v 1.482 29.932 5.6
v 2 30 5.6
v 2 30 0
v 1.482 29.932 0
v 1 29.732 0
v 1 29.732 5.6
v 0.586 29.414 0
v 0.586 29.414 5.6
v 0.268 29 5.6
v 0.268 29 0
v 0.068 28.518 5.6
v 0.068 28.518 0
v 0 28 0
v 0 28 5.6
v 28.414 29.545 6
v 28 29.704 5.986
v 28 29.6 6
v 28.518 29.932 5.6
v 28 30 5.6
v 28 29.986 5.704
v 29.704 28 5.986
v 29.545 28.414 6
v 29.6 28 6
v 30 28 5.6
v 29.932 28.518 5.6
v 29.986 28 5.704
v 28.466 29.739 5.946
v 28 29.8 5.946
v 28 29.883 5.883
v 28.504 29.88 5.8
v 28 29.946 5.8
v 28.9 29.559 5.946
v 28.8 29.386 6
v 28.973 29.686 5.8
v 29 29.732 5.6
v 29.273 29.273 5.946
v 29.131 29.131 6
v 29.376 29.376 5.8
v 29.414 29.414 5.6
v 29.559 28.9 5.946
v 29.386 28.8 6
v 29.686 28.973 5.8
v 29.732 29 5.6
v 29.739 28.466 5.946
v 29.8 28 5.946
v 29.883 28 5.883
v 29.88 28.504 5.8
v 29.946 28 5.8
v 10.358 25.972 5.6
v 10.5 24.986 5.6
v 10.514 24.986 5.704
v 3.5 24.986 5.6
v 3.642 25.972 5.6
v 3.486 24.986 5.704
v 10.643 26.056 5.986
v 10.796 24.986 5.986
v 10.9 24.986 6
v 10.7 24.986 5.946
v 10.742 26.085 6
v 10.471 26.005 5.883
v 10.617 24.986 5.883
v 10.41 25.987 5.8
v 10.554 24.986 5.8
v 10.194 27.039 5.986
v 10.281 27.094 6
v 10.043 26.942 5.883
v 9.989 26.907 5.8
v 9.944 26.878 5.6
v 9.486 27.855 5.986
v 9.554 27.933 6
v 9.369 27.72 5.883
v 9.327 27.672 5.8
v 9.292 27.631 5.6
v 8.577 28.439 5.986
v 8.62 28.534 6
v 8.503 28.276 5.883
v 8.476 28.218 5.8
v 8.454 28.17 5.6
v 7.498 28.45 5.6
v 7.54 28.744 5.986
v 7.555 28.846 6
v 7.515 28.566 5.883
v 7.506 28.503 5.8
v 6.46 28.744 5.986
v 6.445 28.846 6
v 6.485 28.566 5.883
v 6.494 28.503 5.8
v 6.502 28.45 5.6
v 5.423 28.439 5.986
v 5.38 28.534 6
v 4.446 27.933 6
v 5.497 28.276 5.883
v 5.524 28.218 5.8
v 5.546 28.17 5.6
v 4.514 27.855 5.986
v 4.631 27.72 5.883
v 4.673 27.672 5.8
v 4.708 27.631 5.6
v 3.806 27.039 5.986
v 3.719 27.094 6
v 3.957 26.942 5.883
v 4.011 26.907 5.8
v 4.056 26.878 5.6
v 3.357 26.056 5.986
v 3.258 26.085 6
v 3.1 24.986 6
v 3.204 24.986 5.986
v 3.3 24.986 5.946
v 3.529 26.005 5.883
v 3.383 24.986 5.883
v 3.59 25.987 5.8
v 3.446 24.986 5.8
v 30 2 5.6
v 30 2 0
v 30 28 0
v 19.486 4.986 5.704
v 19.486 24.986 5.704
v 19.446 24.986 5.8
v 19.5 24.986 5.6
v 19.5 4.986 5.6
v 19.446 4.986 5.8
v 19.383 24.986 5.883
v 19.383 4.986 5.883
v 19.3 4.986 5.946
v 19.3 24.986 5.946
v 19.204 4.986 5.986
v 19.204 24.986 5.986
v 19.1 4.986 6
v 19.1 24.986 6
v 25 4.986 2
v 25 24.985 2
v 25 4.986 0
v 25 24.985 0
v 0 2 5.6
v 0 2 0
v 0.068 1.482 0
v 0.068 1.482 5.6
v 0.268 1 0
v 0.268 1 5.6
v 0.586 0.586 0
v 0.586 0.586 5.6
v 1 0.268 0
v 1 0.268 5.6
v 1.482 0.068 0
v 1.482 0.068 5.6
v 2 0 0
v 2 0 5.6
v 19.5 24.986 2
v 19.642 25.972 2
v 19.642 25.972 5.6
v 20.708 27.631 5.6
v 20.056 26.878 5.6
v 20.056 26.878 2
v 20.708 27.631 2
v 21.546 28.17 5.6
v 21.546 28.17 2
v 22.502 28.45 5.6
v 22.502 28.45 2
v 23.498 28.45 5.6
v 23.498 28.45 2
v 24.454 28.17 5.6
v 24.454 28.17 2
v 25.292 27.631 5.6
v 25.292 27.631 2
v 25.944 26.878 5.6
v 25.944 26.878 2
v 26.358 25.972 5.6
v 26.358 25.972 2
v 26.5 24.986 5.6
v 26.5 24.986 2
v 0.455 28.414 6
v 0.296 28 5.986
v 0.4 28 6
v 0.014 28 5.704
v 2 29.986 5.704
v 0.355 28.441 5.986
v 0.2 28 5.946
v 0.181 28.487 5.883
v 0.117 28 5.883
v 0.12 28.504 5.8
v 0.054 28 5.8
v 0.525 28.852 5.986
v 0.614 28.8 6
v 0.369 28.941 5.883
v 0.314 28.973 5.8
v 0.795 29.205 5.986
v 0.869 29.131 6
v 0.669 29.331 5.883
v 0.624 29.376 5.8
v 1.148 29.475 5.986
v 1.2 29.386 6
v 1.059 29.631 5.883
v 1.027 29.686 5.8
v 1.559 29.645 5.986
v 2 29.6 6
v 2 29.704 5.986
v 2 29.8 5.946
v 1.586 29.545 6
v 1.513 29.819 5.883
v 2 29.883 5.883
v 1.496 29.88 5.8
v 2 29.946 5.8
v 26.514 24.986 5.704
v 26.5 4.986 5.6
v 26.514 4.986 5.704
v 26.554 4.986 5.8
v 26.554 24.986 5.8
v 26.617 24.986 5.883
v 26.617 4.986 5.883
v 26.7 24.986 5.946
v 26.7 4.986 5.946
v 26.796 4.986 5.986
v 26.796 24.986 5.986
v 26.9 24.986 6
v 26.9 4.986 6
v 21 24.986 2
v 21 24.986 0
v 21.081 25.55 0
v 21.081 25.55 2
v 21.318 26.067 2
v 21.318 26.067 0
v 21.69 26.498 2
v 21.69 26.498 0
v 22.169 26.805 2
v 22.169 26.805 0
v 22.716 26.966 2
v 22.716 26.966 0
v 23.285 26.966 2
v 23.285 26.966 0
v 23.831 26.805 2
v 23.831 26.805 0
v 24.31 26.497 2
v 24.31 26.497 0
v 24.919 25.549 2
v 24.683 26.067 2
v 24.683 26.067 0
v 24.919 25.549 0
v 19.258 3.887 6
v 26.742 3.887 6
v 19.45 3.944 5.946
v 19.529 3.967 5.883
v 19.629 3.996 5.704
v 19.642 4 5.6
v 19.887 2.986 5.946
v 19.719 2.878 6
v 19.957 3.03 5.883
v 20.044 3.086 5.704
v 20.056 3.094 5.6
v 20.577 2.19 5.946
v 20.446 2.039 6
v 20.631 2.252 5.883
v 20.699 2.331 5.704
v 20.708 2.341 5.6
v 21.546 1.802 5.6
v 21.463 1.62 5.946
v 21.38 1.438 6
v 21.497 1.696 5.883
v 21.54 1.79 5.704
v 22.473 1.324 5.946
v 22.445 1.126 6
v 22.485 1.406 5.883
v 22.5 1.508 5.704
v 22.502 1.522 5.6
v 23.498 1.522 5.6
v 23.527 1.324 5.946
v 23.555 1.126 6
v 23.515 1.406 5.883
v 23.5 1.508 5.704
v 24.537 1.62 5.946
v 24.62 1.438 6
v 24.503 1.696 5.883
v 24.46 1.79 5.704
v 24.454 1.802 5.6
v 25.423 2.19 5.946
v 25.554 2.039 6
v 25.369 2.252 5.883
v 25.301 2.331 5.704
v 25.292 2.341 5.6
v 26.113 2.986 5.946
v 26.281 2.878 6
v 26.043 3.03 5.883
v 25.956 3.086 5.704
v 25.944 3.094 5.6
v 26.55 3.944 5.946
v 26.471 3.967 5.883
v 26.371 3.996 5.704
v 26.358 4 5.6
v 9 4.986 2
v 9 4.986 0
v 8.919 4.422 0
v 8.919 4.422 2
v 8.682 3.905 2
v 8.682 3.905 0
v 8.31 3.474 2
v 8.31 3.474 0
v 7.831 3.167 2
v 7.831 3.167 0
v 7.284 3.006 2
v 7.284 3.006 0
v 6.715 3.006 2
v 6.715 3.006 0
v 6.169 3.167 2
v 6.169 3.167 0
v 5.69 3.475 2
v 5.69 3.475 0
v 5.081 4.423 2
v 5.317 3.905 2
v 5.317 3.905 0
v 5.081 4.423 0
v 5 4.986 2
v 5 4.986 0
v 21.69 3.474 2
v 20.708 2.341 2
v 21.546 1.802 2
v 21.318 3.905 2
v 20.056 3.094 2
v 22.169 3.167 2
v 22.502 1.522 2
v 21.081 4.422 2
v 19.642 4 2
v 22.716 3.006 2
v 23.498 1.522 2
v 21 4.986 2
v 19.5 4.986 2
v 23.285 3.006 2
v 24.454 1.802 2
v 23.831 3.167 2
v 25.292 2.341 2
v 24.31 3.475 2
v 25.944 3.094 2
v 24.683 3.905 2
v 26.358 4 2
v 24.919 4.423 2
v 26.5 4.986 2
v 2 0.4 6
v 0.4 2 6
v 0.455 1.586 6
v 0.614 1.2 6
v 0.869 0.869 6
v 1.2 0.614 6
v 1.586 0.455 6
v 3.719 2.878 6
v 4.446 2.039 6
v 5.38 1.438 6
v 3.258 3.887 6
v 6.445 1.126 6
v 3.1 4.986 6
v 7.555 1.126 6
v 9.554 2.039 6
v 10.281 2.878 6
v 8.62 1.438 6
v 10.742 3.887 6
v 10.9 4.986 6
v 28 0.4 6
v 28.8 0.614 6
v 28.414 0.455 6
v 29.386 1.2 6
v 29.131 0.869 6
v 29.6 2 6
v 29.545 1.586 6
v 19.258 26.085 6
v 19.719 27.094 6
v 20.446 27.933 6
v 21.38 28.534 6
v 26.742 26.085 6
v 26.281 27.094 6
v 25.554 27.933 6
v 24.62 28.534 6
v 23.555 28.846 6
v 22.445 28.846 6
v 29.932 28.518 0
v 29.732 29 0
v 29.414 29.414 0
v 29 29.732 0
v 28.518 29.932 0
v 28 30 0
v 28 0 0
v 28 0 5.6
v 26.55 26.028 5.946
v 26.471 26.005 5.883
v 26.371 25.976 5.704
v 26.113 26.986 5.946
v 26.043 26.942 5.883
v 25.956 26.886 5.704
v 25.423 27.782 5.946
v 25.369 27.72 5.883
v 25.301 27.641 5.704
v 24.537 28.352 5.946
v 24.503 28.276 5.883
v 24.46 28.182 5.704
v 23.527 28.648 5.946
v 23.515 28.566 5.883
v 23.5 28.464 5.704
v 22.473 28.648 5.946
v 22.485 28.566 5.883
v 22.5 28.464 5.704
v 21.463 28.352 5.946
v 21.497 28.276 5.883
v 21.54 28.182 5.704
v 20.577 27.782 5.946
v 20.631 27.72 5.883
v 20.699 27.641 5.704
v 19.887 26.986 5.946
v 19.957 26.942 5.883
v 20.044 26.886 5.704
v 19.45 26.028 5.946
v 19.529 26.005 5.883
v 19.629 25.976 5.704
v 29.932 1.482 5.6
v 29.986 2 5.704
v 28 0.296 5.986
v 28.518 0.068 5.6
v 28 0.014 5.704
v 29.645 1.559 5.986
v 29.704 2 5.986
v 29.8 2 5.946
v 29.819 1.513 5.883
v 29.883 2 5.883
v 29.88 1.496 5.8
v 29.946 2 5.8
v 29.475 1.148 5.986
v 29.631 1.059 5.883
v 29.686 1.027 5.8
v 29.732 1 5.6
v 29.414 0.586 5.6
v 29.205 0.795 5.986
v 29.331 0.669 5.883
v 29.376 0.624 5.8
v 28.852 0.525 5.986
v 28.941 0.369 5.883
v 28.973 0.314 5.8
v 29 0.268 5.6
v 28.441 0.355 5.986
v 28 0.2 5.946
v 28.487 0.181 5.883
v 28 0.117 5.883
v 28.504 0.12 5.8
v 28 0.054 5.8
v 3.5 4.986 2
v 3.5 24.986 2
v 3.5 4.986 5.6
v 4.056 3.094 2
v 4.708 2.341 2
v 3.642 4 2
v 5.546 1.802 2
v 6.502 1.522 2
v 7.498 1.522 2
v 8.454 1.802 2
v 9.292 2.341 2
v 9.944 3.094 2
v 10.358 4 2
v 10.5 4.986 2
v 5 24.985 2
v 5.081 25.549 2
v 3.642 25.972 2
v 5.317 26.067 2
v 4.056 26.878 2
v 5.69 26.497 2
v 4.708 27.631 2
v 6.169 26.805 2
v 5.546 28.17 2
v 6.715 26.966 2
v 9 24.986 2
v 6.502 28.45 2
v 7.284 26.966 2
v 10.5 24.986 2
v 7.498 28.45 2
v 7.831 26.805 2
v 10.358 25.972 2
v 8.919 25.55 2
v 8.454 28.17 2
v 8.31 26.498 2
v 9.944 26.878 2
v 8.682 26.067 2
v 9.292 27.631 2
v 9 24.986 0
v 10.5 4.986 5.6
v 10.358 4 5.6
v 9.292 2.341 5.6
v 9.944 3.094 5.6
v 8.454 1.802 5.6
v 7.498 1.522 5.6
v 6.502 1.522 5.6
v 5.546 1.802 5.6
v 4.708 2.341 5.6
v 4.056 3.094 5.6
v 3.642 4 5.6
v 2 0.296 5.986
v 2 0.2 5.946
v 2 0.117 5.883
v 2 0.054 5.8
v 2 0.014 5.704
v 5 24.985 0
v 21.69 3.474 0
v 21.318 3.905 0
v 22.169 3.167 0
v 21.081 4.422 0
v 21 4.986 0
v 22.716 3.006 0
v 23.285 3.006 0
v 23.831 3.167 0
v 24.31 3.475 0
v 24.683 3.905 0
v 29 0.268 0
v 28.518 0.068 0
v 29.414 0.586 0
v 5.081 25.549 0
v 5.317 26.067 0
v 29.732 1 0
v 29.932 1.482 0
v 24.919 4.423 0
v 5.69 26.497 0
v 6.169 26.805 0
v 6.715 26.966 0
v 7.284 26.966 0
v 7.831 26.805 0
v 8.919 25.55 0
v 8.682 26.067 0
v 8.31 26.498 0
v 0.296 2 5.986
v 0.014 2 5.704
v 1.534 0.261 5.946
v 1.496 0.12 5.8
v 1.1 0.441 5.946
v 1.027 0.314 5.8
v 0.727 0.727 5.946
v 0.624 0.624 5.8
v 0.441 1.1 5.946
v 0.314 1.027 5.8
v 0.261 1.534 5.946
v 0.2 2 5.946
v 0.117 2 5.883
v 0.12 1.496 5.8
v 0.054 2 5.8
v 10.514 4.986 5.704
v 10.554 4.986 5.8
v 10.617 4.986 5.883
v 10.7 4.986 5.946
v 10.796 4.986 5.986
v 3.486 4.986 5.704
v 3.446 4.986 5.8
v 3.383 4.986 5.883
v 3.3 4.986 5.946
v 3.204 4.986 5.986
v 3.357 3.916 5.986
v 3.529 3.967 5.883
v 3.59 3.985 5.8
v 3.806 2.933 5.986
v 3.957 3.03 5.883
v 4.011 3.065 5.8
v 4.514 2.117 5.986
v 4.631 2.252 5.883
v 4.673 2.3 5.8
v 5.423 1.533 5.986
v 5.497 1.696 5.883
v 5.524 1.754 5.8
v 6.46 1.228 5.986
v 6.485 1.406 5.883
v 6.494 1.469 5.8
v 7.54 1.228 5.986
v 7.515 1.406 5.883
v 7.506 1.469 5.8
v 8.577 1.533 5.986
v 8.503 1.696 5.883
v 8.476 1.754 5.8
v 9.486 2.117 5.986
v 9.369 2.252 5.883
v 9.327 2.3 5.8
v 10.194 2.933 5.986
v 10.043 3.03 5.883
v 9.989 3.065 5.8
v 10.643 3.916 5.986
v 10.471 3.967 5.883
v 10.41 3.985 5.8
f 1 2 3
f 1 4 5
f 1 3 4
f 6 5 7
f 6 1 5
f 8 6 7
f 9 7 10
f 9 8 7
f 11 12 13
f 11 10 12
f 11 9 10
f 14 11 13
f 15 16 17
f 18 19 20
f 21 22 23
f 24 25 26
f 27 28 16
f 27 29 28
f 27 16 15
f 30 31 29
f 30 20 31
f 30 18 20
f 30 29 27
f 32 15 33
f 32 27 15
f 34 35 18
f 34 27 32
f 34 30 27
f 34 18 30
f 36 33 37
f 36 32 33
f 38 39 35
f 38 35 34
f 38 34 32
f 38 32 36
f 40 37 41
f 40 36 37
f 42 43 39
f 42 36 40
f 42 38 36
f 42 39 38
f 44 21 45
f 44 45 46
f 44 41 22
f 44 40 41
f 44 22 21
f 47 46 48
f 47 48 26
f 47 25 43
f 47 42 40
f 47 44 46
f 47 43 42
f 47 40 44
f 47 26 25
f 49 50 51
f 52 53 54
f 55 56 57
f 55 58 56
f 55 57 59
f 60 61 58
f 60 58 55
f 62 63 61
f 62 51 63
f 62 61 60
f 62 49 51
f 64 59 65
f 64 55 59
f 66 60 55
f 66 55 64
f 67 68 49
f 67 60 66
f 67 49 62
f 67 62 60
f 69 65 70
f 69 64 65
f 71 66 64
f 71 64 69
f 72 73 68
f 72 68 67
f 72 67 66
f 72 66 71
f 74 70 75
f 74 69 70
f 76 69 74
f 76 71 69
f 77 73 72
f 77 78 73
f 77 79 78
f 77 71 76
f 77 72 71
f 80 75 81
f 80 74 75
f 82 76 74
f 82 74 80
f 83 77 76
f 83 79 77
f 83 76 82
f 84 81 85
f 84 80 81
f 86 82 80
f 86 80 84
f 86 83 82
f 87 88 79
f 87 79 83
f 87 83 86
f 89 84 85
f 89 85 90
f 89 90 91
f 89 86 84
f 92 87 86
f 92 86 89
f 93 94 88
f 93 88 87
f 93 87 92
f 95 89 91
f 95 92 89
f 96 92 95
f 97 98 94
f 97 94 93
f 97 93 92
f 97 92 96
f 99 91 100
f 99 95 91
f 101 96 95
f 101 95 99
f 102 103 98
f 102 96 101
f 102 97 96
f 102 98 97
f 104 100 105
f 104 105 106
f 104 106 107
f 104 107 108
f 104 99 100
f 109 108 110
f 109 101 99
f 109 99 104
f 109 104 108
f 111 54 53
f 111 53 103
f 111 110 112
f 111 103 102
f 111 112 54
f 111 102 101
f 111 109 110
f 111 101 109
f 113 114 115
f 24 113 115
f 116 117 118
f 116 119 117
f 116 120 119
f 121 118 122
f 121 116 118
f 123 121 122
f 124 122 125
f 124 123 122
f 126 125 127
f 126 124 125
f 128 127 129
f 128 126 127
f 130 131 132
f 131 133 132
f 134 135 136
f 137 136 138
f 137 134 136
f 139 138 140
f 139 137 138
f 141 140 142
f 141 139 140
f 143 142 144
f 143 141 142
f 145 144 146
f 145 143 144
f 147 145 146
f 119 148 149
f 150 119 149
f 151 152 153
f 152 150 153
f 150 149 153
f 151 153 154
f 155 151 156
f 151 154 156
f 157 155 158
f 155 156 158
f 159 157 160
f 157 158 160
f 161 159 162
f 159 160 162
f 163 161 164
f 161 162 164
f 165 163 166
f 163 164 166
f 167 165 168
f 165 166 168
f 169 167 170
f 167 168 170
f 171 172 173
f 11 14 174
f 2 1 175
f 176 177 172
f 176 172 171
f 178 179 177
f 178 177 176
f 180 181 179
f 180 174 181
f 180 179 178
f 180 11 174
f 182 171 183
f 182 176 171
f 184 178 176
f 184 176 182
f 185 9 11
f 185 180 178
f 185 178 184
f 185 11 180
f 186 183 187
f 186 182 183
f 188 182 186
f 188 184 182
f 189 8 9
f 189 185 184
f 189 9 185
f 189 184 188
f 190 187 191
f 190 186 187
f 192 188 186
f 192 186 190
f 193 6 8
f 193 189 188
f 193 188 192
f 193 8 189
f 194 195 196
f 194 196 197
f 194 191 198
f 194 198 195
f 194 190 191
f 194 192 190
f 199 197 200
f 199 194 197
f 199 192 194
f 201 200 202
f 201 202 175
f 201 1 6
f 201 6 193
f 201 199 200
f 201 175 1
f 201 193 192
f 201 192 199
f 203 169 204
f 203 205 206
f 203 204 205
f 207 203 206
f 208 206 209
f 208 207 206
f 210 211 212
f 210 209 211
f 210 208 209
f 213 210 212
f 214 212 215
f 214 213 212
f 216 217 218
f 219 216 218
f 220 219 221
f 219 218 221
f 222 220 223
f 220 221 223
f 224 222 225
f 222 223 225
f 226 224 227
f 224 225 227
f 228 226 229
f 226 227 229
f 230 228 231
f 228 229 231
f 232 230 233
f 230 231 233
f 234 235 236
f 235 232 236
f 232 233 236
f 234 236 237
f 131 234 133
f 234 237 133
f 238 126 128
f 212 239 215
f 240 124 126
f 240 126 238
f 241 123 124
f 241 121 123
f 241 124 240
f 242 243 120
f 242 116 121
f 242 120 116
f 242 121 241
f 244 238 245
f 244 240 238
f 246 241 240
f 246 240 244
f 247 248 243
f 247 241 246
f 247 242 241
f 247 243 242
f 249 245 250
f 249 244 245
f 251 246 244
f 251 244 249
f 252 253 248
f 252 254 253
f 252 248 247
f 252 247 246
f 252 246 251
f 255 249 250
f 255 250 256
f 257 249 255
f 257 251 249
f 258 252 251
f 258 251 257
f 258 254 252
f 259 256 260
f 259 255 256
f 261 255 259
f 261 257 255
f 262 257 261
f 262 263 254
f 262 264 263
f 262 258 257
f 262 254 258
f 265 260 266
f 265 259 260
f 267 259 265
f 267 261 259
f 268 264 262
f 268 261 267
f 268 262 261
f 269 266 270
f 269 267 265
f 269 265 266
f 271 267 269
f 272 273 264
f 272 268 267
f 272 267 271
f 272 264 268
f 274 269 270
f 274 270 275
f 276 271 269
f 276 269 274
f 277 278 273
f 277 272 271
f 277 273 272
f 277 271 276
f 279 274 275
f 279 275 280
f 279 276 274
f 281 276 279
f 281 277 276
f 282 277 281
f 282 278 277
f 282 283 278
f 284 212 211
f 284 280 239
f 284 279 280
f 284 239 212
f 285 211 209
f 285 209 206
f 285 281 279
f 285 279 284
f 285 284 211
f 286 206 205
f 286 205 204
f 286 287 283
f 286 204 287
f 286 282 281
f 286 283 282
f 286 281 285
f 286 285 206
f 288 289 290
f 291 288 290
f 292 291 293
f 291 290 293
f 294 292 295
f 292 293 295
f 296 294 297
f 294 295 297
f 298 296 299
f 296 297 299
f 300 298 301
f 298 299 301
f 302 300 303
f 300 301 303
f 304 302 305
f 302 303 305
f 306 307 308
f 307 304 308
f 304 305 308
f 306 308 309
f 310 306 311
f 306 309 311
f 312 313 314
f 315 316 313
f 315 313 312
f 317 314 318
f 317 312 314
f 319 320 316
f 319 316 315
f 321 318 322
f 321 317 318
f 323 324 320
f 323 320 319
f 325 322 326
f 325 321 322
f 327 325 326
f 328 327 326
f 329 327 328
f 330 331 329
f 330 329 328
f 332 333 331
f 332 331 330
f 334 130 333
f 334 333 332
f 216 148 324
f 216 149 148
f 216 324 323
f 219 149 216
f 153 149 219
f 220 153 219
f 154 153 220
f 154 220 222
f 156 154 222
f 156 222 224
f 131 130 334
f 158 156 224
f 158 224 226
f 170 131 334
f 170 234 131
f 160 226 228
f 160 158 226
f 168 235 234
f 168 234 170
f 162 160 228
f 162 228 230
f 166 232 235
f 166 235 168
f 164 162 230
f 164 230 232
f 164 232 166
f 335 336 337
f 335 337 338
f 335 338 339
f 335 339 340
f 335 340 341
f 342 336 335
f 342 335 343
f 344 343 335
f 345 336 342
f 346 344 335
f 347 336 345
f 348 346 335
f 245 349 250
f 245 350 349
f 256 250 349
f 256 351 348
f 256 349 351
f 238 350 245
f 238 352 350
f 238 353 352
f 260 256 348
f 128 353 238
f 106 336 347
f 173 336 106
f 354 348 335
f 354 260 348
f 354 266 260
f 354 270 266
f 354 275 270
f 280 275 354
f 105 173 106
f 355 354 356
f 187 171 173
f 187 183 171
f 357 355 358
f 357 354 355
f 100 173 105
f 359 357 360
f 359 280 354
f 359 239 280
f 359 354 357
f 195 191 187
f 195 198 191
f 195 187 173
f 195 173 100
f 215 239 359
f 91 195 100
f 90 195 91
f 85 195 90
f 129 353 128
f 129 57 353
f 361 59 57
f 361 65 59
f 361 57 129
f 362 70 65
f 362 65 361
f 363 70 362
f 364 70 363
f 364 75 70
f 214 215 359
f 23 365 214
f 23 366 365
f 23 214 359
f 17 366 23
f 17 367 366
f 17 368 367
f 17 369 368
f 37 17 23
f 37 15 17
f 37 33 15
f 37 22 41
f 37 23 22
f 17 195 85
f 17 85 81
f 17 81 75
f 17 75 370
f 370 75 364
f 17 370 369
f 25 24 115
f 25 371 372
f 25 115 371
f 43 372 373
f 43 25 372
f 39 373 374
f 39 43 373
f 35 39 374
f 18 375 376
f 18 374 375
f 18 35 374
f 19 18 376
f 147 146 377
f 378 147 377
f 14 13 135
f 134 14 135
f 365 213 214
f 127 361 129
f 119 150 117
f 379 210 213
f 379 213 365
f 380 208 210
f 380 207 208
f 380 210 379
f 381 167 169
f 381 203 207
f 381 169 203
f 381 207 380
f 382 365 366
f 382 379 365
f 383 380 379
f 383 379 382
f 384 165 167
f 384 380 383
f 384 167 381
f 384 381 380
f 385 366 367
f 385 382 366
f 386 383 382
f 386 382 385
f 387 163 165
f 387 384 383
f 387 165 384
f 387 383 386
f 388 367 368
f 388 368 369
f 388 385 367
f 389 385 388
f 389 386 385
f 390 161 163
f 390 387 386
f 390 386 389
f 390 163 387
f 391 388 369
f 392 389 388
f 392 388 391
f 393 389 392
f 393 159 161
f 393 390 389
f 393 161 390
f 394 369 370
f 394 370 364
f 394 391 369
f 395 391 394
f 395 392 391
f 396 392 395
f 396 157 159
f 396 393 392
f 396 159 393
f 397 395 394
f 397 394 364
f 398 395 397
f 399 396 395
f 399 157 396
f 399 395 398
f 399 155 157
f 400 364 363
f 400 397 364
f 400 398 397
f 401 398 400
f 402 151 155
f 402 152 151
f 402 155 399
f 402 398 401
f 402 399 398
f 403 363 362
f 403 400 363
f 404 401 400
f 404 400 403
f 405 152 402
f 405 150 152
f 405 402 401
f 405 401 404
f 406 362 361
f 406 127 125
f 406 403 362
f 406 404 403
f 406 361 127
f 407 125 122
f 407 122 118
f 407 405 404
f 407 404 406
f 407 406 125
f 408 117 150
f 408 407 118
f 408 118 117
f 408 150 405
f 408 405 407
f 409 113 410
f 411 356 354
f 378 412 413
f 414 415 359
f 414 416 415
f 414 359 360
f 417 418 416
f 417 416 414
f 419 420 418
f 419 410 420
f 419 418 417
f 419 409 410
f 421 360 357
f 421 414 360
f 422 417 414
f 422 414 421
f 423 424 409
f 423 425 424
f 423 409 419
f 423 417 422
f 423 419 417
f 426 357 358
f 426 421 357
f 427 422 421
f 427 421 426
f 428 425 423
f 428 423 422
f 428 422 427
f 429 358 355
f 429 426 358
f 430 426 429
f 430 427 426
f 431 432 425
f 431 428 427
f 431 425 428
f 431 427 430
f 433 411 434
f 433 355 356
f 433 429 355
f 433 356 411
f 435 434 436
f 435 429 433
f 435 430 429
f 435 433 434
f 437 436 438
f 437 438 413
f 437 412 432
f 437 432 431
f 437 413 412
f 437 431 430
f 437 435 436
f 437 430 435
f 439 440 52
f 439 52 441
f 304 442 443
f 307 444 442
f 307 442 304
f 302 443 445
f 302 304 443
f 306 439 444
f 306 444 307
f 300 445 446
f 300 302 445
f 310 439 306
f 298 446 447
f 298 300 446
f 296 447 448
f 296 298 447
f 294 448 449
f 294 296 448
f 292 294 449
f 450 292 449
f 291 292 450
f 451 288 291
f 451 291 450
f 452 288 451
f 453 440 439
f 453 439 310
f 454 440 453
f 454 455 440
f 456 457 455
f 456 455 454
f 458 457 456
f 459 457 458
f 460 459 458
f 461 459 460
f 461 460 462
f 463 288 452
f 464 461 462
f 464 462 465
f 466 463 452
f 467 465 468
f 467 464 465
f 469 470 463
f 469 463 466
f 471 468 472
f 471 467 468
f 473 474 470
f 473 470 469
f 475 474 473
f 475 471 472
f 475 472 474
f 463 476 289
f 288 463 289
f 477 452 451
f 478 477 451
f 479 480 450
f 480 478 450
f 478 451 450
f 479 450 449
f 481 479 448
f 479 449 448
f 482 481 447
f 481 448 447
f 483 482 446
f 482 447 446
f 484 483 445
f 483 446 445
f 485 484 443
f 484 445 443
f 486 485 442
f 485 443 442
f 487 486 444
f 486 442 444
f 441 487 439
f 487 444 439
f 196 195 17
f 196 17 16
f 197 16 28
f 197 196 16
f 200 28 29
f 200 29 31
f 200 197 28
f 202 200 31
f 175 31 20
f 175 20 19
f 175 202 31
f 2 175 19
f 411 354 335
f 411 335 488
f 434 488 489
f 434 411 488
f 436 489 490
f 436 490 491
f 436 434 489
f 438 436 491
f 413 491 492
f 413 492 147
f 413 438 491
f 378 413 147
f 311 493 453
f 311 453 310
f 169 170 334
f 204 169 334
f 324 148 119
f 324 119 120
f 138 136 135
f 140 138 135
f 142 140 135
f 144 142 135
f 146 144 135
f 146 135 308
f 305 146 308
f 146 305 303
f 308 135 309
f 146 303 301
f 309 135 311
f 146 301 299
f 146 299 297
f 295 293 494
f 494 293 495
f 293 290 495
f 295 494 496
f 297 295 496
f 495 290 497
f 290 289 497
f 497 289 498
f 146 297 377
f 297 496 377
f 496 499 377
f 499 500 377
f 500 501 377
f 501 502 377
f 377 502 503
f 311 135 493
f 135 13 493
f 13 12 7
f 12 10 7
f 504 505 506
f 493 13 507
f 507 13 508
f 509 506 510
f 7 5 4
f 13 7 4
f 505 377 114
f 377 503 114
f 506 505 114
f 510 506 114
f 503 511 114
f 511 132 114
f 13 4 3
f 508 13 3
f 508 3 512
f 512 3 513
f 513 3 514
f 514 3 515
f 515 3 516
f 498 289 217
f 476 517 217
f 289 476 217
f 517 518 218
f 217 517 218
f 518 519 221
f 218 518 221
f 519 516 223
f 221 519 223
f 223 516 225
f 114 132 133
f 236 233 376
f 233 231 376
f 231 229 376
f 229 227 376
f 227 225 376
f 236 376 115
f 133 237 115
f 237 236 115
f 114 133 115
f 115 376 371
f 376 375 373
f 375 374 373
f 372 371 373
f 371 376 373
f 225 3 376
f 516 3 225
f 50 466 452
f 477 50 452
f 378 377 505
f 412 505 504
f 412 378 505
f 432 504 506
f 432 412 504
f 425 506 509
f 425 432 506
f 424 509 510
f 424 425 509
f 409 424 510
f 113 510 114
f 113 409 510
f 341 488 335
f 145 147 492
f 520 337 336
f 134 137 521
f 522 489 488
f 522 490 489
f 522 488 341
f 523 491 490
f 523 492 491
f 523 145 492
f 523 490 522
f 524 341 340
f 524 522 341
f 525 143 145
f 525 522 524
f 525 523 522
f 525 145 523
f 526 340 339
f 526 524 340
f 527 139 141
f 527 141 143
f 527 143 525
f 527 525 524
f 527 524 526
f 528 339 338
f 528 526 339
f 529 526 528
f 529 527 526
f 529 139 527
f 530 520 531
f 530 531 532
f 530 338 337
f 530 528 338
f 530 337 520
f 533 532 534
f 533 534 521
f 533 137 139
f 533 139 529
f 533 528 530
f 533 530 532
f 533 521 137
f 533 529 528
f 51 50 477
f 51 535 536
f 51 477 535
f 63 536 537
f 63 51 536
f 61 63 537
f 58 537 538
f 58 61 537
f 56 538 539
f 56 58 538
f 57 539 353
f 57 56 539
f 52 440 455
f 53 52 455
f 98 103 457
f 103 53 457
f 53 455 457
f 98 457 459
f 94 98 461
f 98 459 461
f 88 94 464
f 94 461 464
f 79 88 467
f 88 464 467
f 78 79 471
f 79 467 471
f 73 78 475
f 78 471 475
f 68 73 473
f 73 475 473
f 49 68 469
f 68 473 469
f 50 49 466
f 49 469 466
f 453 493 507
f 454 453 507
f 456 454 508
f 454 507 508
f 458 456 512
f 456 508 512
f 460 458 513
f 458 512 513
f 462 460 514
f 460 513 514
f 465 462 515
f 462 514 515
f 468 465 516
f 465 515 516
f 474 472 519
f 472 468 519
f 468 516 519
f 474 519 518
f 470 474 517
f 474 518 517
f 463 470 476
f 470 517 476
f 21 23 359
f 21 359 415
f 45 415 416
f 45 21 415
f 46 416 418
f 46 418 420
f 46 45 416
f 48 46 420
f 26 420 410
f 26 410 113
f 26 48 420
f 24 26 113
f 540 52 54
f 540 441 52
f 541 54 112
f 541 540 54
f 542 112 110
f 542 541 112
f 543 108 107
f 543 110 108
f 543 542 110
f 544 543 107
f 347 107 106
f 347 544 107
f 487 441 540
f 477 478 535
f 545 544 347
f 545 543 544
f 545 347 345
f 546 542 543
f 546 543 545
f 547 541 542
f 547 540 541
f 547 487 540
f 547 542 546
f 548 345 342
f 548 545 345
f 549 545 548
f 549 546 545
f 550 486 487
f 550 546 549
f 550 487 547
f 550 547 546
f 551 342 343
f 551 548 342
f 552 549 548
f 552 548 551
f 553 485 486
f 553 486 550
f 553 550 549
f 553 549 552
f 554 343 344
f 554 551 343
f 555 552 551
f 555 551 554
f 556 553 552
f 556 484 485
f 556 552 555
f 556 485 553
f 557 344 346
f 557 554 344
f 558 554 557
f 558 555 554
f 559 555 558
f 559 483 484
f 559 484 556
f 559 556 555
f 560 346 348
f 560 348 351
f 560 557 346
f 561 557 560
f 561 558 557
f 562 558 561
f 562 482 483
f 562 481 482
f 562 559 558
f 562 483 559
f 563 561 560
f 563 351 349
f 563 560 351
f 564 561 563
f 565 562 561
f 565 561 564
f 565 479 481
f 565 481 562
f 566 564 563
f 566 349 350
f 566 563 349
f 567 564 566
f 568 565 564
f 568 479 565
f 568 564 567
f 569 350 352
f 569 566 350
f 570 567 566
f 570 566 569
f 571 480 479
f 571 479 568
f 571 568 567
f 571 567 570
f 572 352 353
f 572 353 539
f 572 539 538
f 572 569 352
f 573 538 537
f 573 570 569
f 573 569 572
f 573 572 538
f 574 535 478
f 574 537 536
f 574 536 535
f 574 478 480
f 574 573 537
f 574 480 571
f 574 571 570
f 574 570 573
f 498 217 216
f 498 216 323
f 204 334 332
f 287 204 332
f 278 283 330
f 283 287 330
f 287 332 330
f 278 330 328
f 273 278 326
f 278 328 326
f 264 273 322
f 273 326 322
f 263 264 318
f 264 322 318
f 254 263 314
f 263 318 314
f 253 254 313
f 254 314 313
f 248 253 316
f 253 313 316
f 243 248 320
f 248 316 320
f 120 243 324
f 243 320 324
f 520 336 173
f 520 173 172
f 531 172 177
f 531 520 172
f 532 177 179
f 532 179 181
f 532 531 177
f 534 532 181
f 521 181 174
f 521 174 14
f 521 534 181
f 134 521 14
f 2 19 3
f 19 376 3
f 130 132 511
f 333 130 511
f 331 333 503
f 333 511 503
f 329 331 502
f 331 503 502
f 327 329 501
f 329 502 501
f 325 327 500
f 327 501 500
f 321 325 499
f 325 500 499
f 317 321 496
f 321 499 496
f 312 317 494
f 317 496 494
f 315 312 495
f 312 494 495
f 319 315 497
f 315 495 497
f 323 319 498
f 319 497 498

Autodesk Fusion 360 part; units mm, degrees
sketch "Sketch1" plane through (0, 0, 0) normal (0, 0, 1) x (1, 0, 0)
  line L0 (0, 0) -> (30, 0)
  line L1 (30, 0) -> (30, 30)
  line L2 (30, 30) -> (0, 30)
  line L3 (0, 30) -> (0, 0)
  line L4 (7, 30) -> (7, 0) construction
  line L5 (23, 30) -> (23, 0) construction
  line L6 (15, 30) -> (15, 0) construction
  line L7 (3.5, 24.986) -> (3.5, 4.986)
  line L8 (10.5, 24.986) -> (10.5, 4.986)
  arc A0 (10.5, 24.986) -> (3.5, 24.986) centre (7, 24.986) ccw
  arc A1 (3.5, 4.986) -> (10.5, 4.986) centre (7, 4.986) ccw
  line L9 (5, 24.9854) -> (5, 4.9865)
  line L10 (9, 24.986) -> (9, 4.986)
  arc A2 (9, 24.986) -> (5, 24.9854) centre (7, 24.986) ccw
  arc A3 (5, 4.9865) -> (9, 4.986) centre (7, 4.986) ccw
  line L11 (26.5, 24.986) -> (26.5, 4.986)
  line L12 (25, 24.9854) -> (25, 4.9865)
  arc A4 (25, 24.9854) -> (21, 24.986) centre (23, 24.986) ccw
  arc A5 (21, 4.986) -> (25, 4.9865) centre (23, 4.986) ccw
  arc A6 (26.5, 24.986) -> (19.5, 24.986) centre (23, 24.986) ccw
  line L13 (19.5, 24.986) -> (19.5, 4.986)
  line L14 (21, 24.986) -> (21, 4.986)
  arc A7 (19.5, 4.986) -> (26.5, 4.986) centre (23, 4.986) ccw
  point P0 (7, 21.986)
  point P1 (23, 21.9825)
  point P2 (23.0012, 7.9825)
  point P3 (7.0013, 7.986)
  point P4 (23, 21.986)
  point P5 (22.9987, 7.986)
  dimension "d1" = 30
  dimension "d2" = 30
  dimension "d3" = 16
  dimension "d4" = 14
  dimension "d5" = 7
  dimension "d6" = 3
  dimension "d7" = 14
  dimension "d8" = 16
  dimension "d9" = 7
  dimension "d10" = 3
  dimension "d11" = 7
  dimension "d12" = 4
  dimension "d13" = 4
  dimension "d14" = 4
extrude "Extrude1" add sketch "Sketch1" along normal blind 6 contours L0 L1 L2 L3
extrude "Extrude2" add sketch "Sketch1" along normal blind 2 contours L7 L8 A0 A1 | L11 A6 L13 A7
fillet "Fillet1" radius 2 4 edges at (0, 0, 3) (30, 0, 3) (30, 30, 3) (0, 30, 3)
fillet "Fillet1" radius 0.4 1 faces at (13.5, 11.6527, 6)
